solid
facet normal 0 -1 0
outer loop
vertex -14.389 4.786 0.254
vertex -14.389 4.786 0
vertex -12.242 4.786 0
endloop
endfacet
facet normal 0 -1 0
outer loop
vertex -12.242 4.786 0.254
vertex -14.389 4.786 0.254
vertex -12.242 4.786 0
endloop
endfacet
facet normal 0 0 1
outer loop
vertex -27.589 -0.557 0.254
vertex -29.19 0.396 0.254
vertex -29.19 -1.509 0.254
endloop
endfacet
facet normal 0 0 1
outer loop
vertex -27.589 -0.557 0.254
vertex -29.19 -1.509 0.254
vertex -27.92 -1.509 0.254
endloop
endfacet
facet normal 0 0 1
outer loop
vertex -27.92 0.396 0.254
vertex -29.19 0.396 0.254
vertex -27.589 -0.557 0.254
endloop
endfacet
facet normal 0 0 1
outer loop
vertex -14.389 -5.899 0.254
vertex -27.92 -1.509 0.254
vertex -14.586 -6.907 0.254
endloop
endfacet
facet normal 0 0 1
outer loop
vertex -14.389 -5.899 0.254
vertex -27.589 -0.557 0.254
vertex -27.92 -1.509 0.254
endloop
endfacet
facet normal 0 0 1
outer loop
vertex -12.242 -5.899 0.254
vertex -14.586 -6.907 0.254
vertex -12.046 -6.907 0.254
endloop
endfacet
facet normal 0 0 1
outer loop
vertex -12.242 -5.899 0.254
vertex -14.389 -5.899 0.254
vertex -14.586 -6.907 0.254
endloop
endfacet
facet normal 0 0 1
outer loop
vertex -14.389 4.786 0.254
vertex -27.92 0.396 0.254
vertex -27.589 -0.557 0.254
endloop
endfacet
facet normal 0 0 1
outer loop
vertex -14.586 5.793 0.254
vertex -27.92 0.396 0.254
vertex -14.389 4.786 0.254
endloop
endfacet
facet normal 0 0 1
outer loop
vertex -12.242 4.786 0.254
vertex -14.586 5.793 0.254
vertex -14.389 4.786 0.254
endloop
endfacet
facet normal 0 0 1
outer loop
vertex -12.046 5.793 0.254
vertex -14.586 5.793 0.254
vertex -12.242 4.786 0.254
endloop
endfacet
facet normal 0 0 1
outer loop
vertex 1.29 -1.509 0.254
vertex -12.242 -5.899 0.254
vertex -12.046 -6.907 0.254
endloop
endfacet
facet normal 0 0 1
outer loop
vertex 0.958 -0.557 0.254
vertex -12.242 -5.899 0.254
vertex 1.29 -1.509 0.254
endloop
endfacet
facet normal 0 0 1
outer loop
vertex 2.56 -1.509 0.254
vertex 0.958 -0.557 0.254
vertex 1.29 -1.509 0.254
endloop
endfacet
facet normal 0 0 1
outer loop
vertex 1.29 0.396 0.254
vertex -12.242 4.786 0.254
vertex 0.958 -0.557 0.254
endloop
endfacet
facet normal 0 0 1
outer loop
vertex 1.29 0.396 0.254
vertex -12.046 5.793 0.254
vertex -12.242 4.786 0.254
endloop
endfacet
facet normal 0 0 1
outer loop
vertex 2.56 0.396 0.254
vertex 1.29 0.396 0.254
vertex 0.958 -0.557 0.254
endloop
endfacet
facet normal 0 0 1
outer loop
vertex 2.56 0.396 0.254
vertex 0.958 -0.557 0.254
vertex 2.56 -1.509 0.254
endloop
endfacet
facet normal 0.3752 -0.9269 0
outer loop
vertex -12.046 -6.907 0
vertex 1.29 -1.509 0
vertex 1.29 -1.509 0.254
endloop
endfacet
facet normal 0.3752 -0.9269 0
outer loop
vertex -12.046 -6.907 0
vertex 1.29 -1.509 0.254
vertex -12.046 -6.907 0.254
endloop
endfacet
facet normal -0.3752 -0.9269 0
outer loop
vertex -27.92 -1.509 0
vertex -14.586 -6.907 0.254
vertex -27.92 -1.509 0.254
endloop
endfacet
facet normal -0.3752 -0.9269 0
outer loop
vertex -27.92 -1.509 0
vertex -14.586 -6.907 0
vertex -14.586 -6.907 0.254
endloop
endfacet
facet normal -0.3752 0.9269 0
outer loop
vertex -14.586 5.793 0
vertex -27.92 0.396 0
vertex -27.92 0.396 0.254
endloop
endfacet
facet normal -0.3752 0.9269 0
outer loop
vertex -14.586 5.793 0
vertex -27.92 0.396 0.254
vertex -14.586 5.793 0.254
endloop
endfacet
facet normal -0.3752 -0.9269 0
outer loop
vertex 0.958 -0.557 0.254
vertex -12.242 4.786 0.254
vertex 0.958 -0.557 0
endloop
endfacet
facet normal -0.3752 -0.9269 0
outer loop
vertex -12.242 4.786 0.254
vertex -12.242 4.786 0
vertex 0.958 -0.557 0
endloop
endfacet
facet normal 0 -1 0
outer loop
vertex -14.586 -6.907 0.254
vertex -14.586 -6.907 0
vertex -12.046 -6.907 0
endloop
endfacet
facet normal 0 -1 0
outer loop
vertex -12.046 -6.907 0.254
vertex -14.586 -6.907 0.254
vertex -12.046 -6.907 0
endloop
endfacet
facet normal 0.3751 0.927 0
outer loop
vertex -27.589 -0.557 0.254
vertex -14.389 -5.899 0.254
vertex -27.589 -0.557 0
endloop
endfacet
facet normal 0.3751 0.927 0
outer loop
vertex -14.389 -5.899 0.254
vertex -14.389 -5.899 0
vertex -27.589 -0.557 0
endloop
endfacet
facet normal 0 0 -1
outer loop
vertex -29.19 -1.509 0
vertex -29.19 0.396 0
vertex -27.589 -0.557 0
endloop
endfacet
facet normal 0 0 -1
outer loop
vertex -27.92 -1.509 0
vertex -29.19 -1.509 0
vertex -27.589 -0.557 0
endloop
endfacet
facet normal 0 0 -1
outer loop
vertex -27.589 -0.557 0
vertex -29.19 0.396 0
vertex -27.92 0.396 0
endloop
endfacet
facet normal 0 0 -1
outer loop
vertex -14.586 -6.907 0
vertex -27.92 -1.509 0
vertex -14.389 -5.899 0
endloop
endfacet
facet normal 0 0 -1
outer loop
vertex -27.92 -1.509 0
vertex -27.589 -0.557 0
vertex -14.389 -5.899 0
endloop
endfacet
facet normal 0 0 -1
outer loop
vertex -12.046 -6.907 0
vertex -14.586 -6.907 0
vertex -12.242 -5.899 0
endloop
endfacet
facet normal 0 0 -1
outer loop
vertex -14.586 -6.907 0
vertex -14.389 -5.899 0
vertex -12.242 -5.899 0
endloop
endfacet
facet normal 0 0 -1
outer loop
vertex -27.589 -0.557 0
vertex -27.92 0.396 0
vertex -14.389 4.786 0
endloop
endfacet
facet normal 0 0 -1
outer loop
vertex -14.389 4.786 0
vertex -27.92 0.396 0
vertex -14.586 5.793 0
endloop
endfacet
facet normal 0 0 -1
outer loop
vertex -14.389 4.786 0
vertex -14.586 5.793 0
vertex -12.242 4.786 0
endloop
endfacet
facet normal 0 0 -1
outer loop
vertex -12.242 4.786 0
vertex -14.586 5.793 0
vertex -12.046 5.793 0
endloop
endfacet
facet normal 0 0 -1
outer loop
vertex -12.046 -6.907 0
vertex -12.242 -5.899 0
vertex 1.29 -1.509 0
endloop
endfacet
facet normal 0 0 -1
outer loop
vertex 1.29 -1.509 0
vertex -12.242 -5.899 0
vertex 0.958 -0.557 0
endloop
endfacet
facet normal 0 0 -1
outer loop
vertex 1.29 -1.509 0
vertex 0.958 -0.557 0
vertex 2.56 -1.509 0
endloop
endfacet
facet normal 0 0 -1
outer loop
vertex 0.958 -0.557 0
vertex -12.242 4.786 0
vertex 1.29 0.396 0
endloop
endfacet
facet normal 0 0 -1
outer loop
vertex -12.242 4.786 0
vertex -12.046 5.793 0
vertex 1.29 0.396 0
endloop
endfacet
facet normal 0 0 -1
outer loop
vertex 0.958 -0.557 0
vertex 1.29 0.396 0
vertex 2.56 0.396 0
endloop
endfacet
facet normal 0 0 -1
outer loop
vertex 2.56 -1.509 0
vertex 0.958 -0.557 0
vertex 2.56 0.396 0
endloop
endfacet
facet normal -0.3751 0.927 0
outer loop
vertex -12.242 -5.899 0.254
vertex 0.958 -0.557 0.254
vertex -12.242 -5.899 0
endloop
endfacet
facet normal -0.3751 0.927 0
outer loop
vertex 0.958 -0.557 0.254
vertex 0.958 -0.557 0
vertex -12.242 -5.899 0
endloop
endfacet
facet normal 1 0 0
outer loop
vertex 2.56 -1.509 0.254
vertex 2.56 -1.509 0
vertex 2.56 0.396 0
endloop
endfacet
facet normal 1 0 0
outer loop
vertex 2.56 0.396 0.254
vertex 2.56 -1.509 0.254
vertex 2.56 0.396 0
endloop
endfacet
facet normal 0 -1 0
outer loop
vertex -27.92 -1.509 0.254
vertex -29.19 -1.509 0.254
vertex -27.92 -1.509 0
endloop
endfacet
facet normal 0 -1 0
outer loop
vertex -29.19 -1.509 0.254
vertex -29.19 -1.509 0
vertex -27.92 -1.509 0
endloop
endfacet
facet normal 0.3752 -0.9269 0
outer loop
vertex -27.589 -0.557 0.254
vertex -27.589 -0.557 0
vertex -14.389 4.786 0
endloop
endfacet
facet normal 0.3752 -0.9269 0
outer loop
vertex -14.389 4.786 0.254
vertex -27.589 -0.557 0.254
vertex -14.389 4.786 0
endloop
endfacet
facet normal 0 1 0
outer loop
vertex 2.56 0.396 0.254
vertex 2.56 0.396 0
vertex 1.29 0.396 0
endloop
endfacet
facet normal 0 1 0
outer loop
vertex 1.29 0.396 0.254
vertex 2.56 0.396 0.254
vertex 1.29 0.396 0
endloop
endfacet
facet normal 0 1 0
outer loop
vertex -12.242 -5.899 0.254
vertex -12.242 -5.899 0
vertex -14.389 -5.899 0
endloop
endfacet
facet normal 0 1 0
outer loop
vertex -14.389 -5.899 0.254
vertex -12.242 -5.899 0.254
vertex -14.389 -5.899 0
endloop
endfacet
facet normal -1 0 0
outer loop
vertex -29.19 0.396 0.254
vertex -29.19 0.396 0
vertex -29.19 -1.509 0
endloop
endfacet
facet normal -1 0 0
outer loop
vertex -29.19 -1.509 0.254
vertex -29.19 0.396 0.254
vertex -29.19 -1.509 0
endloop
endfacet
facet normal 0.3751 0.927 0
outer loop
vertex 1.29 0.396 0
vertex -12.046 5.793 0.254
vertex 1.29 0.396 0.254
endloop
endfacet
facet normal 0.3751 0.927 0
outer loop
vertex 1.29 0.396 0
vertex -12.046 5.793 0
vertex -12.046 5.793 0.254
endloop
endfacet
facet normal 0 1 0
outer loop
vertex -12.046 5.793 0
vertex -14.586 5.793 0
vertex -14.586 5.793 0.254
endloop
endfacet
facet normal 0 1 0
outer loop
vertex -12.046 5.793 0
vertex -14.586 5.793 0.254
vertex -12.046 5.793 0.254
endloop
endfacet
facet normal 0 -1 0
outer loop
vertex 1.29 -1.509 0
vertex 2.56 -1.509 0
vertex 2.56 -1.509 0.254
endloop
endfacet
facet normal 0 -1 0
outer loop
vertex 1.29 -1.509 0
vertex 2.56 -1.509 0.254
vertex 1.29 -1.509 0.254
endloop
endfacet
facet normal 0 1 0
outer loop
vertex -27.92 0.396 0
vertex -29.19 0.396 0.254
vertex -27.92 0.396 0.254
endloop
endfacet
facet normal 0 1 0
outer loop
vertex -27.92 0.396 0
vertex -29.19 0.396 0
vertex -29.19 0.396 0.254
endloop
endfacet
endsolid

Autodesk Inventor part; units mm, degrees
ref_plane "YZ Plane" through (0, 0, 0) normal (1, 0, 0) x (0, 1, 0)
ref_plane "XZ Plane" through (0, 0, 0) normal (0, 1, 0) x (-1, 0, 0)
ref_plane "XY Plane" through (0, 0, 0) normal (0, 0, 1) x (1, 0, 0)
sketch "Sketch1" plane through (0, 0, 0) normal (0, 0, 1) x (1, 0, 0)
  line L0 (-29.1905, 5.7934) -> (2.5595, 5.7934) construction
  line L1 (2.5595, 5.7934) -> (2.5595, -6.9066) construction
  line L2 (2.5595, -6.9066) -> (-29.1905, -6.9066) construction
  line L3 (-29.1905, -6.9066) -> (-29.1905, 5.7934) construction
  line L4 (-29.1905, -0.5566) -> (-27.9205, -0.5566) construction
  line L5 (-29.1905, 0.3959) -> (-27.9205, 0.3959)
  line L6 (-29.1905, -1.5091) -> (-27.9205, -1.5091)
  line L7 (-13.3155, 5.7934) -> (-13.3155, -6.9066) construction
  line L8 (2.5595, -0.5566) -> (1.2895, -0.5566) construction
  line L9 (2.5595, 0.3959) -> (1.2895, 0.3959)
  line L10 (2.5595, -1.5091) -> (1.2895, -1.5091)
  line L11 (-14.5855, 5.7934) -> (-12.0455, 5.7934)
  line L12 (-14.5855, -6.9066) -> (-12.0455, -6.9066)
  line L13 (-27.9205, 0.3959) -> (-14.5855, 5.7934)
  line L14 (-12.0455, 5.7934) -> (1.2895, 0.3959)
  line L15 (1.2895, -1.5091) -> (-12.0455, -6.9066)
  line L16 (-14.5855, -6.9066) -> (-27.9205, -1.5091)
  line L17 (-29.1905, 0.3959) -> (-29.1905, -1.5091)
  line L18 (2.5595, -1.5091) -> (2.5595, 0.3959)
  line L19 (0.9577, -0.5566) -> (-12.2417, -5.8992)
  line L20 (-12.2417, -5.8992) -> (-14.3894, -5.8992)
  line L21 (-14.3894, -5.8992) -> (-27.5888, -0.5566)
  line L22 (-27.5888, -0.5566) -> (-14.3894, 4.786)
  line L23 (-14.3894, 4.786) -> (-12.2417, 4.786)
  line L24 (-12.2417, 4.786) -> (0.9577, -0.5566)
  point P0 (0, 0)
  dimension "d0" = 12.7
  dimension "d1" = 31.75
  dimension "d2" = 15.875
  dimension "d3" = 1.905
  dimension "d4" = 2.54
  dimension "d5" = 1.27
extrude "Extrusion1" add sketch "Sketch1" along normal blind 0.254
properties part number "Expanded Metal STOCK"
